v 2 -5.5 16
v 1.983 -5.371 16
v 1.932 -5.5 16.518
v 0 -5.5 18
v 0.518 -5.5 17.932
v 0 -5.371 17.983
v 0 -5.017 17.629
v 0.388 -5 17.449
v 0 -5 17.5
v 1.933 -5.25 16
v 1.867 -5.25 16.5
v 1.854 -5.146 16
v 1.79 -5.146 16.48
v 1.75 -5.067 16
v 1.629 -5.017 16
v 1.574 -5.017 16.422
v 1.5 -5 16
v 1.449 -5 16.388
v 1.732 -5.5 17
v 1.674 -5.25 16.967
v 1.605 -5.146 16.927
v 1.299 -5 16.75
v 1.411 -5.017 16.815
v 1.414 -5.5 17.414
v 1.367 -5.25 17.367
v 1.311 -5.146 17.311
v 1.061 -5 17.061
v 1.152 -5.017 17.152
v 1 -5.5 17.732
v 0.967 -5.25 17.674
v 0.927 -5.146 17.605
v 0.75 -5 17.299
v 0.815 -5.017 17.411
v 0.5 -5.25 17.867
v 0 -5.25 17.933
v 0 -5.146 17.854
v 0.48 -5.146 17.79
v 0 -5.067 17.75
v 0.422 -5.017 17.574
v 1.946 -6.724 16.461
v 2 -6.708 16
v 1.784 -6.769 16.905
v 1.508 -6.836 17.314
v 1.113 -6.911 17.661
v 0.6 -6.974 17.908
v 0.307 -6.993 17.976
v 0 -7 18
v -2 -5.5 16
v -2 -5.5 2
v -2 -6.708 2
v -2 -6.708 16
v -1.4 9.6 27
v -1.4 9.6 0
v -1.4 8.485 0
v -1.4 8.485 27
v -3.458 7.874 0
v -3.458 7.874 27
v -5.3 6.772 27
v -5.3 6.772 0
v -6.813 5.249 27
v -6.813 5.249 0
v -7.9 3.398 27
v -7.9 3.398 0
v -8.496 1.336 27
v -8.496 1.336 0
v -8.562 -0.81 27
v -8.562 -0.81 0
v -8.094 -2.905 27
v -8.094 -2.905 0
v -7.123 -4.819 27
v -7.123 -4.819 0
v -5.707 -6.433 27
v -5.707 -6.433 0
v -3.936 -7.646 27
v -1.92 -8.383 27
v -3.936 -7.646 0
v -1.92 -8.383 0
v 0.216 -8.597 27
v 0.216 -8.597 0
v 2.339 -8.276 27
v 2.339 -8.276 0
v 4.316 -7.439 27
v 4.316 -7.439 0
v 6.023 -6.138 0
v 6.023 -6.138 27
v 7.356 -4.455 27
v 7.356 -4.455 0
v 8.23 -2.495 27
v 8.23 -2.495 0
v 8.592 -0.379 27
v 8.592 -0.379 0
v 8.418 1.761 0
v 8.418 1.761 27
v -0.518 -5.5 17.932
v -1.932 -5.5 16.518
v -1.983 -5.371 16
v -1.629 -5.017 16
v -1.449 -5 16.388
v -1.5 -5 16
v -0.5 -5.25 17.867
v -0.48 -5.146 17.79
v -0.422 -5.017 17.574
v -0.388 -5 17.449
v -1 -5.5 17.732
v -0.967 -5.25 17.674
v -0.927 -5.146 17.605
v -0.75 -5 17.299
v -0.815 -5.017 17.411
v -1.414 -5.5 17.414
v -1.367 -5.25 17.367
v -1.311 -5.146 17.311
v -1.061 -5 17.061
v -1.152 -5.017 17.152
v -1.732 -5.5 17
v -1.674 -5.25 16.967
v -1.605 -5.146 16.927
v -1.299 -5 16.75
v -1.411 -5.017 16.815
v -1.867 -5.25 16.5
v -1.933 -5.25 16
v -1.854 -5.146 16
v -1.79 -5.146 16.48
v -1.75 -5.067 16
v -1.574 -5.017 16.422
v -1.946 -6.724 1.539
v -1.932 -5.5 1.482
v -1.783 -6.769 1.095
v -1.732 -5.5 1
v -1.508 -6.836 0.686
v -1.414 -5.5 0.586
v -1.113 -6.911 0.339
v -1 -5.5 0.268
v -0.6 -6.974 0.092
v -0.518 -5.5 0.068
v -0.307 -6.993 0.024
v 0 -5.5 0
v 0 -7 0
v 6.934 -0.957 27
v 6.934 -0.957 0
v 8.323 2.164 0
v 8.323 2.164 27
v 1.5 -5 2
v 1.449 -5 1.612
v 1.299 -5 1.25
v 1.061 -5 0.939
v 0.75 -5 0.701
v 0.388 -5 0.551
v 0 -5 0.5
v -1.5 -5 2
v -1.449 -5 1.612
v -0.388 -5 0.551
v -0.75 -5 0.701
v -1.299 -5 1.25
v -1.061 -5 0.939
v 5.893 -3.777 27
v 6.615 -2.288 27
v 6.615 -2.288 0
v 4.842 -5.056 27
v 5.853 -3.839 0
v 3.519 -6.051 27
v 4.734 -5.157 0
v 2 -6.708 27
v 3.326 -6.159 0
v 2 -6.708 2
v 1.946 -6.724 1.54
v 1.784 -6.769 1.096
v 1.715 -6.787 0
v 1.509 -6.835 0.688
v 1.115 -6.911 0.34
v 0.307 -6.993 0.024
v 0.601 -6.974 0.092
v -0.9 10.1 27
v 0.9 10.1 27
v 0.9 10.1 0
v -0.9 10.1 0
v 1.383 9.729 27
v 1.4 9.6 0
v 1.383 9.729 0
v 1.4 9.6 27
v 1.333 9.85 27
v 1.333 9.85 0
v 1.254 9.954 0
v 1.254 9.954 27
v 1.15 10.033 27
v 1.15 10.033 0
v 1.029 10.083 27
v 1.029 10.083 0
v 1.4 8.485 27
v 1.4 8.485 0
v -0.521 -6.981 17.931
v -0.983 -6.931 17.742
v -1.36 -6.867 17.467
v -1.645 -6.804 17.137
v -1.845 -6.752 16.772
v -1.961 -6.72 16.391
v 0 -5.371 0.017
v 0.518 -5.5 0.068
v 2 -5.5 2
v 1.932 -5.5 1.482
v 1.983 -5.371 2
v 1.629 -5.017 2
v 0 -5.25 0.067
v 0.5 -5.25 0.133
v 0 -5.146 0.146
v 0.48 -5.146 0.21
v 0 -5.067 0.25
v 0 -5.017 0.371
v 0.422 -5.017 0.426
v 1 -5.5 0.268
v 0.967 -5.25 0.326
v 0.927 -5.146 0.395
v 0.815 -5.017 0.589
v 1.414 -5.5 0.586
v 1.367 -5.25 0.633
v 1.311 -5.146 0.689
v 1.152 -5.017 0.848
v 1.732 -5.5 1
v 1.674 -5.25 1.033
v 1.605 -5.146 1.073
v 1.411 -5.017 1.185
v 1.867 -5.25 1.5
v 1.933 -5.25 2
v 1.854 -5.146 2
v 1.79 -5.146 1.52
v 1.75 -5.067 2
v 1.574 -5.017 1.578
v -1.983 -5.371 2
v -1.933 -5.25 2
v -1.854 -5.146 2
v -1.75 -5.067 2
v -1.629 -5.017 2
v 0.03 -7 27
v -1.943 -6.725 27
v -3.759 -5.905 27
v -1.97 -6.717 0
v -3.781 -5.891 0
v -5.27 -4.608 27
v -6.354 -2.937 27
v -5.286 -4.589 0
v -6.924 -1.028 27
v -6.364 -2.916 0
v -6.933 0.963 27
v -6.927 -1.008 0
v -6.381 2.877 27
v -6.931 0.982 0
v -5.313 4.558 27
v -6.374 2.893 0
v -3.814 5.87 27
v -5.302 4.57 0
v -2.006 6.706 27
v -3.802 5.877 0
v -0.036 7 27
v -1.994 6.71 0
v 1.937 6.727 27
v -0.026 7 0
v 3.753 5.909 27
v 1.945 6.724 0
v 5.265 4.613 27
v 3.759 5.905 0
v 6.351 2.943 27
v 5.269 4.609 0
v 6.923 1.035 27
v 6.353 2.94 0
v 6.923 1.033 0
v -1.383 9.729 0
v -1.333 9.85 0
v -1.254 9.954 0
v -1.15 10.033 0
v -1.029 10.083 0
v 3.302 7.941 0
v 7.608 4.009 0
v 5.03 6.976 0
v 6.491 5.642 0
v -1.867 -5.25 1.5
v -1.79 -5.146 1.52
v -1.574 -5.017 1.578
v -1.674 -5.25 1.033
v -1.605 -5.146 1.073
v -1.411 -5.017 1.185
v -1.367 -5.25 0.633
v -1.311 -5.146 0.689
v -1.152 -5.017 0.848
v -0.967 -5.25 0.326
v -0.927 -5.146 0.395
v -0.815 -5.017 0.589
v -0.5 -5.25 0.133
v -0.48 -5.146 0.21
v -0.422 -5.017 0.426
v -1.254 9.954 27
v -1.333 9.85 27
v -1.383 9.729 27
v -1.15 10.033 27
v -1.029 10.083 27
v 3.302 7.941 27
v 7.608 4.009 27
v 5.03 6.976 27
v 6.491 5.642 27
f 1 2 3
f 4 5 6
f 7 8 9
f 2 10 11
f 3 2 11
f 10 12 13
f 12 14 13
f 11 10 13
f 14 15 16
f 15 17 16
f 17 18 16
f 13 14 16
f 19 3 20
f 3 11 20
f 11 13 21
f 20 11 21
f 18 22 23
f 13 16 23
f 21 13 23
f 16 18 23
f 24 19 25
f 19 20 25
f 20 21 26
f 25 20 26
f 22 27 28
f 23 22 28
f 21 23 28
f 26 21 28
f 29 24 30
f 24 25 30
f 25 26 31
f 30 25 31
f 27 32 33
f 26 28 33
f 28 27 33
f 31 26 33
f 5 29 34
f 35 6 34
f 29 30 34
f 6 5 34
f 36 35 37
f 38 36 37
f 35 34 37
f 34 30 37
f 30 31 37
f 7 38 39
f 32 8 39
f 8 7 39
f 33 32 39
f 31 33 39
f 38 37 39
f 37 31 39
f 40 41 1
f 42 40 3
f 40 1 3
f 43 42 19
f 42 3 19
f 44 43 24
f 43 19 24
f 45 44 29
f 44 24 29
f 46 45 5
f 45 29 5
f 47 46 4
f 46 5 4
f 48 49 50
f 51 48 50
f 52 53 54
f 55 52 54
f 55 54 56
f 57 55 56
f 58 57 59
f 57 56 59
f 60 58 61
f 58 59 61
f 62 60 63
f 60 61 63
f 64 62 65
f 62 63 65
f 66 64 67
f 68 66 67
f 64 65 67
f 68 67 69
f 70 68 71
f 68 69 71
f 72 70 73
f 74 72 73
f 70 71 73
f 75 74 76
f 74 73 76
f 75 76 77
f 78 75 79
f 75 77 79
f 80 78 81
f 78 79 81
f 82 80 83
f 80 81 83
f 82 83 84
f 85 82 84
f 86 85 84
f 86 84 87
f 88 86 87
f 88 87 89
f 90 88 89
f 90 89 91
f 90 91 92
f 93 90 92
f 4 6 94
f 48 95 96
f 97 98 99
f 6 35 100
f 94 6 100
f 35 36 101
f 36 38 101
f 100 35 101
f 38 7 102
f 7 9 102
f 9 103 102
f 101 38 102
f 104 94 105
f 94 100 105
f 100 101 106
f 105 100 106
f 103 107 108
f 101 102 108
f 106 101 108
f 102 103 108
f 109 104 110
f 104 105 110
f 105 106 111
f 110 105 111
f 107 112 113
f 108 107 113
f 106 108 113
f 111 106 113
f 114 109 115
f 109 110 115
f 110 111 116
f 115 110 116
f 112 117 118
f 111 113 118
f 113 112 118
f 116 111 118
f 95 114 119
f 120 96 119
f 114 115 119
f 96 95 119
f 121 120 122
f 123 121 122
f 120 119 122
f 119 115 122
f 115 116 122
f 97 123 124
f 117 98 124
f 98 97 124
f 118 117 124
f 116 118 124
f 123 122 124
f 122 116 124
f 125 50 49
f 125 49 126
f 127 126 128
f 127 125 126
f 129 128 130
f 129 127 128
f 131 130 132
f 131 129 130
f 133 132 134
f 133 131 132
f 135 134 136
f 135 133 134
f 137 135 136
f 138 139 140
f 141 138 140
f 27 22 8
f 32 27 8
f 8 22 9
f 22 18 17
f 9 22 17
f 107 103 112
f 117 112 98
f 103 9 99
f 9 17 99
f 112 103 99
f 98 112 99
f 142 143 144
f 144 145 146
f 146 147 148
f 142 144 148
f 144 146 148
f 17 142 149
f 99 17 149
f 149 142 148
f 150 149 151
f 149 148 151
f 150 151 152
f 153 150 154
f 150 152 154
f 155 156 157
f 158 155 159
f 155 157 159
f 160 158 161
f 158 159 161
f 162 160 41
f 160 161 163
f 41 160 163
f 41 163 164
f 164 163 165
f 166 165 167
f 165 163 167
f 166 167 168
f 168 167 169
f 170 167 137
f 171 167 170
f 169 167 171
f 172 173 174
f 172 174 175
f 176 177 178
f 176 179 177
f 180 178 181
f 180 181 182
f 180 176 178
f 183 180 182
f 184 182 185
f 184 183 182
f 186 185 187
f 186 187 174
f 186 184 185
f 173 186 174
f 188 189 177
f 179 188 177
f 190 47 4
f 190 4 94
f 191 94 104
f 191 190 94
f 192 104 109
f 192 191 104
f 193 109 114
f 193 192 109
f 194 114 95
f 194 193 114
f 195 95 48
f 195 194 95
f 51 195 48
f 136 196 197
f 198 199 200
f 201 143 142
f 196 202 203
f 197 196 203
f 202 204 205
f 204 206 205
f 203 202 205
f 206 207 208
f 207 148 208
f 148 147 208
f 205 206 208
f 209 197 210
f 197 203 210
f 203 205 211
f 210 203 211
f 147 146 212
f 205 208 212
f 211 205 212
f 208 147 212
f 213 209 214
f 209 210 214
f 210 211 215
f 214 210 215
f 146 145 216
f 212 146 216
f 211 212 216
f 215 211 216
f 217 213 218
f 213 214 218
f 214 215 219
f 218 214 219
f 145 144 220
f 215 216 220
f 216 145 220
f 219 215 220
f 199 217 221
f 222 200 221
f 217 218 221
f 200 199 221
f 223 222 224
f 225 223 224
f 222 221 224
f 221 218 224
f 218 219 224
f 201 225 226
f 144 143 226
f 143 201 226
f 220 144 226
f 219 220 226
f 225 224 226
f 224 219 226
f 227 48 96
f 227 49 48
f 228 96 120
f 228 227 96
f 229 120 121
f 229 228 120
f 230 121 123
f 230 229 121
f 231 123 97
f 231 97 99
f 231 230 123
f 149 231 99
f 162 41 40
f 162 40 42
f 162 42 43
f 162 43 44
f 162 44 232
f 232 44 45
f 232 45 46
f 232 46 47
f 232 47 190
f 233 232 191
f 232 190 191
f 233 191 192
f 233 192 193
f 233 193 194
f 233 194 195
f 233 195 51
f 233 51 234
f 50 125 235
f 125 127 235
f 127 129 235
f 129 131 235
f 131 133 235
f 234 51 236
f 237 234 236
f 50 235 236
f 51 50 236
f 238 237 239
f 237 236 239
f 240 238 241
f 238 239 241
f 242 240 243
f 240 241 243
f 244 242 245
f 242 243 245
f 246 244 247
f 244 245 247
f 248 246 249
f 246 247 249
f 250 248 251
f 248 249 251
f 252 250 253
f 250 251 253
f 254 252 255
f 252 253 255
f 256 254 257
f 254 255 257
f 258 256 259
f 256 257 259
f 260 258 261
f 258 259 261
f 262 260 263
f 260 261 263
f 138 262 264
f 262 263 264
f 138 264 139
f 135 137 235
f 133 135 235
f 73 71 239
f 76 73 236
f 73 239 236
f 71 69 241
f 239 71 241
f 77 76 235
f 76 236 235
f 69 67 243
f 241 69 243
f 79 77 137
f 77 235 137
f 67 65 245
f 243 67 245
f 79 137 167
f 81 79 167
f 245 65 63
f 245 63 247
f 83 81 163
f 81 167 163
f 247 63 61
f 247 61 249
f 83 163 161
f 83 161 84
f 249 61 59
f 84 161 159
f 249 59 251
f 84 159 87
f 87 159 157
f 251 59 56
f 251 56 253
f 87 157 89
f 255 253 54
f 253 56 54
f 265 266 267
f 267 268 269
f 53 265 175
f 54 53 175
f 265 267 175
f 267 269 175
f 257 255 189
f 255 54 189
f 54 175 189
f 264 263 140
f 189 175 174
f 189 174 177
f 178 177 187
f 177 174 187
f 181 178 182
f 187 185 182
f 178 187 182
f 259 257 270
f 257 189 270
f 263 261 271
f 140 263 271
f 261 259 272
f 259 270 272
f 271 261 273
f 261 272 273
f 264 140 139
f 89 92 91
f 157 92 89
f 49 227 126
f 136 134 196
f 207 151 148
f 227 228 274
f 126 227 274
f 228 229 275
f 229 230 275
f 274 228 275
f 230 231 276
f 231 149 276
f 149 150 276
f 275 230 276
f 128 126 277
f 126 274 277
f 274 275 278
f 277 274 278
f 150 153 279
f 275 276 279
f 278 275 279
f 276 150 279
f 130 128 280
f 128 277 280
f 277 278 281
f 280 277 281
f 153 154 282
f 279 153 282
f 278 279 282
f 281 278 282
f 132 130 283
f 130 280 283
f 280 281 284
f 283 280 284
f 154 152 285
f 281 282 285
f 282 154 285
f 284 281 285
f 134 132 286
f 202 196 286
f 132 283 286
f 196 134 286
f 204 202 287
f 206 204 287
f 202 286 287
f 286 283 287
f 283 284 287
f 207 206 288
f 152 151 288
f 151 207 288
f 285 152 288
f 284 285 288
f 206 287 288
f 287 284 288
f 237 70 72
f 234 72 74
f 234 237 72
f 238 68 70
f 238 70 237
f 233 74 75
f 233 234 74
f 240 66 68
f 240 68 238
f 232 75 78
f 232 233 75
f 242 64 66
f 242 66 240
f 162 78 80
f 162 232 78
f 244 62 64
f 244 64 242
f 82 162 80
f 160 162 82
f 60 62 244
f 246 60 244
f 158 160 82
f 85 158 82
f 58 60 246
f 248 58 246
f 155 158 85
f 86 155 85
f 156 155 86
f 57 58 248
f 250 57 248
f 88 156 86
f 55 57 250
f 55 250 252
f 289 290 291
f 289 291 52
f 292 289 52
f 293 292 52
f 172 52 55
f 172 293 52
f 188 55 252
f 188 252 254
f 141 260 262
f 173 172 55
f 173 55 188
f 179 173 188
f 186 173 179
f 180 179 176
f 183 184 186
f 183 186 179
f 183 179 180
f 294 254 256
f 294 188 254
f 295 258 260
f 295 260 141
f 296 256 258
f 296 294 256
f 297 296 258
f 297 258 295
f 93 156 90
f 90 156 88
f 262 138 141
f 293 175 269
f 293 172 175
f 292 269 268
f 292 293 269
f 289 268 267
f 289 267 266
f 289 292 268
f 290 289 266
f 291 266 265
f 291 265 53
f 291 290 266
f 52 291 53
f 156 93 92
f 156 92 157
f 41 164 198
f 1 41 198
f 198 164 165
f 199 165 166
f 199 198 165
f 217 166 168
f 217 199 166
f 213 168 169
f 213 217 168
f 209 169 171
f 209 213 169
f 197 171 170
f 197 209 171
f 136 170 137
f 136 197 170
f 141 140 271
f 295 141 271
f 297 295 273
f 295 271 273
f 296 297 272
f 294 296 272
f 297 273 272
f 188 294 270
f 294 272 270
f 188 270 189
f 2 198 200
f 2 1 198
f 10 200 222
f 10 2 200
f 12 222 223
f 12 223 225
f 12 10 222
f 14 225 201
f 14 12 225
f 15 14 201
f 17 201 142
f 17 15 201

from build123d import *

# Parameters (mm, degrees)
F1_DEPTH = 27
F2_DEPTH = 18
F3_R     = 1.9999
F4_R     = 0.5


# Not quite as in the source:
# - a fillet or chamfer is up to 0.001 mm smaller than in the source, because OpenCascade refuses the exact size


with BuildPart() as f1:
    # F0 (on Top) → F1 (new body)
    with BuildSketch(Plane.XY):
        with BuildLine():
            ThreePointArc((6.6154708154, -2.2881315283), (4.8415745742, -5.0556063576), (2, -6.7082039325))
            ThreePointArc((2, -6.7082039325), (0, -7), (-2, -6.7082039325))
            ThreePointArc((-2, -6.7082039325), (-3.7888849897, 5.8859451692), (6.9342650073, -0.9570625938))
            Line((6.9342650073, -0.9570625938), (8.3233295817, 2.1638356393))
            ThreePointArc((8.3233295817, 2.1638356393), (5.7987889756, 6.3509091015), (1.4, 8.4852813742))
            Line((1.4, 8.4852813742), (1.4, 10.1))
            Line((1.4, 10.1), (-1.4, 10.1))
            Line((-1.4, 10.1), (-1.4, 8.4852813742))
            ThreePointArc((-1.4, 8.4852813742), (-4.8595970429, -7.0953728994), (8.4177416777, 1.7611431082))
            Line((8.4177416777, 1.7611431082), (6.6154708154, -2.2881315283))
        make_face()
    extrude(amount=F1_DEPTH)

    # F0 (on Top) → F2 (join)
    with BuildSketch(Plane.XY):
        with BuildLine():
            ThreePointArc((-2, -6.7082039325), (0, -7), (2, -6.7082039325))
            Line((2, -6.7082039325), (2, -5))
            Line((2, -5), (-2, -5))
            Line((-2, -5), (-2, -6.7082039325))
        make_face()
        with BuildLine():
            ThreePointArc((6.6154708154, -2.2881315283), (4.8415745742, -5.0556063576), (2, -6.7082039325))
            ThreePointArc((2, -6.7082039325), (0, -7), (-2, -6.7082039325))
            ThreePointArc((-2, -6.7082039325), (-3.7888849897, 5.8859451692), (6.9342650073, -0.9570625938))
            Line((6.9342650073, -0.9570625938), (8.3233295817, 2.1638356393))
            ThreePointArc((8.3233295817, 2.1638356393), (5.7987889756, 6.3509091015), (1.4, 8.4852813742))
            Line((1.4, 8.4852813742), (1.4, 10.1))
            Line((1.4, 10.1), (-1.4, 10.1))
            Line((-1.4, 10.1), (-1.4, 8.4852813742))
            ThreePointArc((-1.4, 8.4852813742), (-4.8595970429, -7.0953728994), (8.4177416777, 1.7611431082))
            Line((8.4177416777, 1.7611431082), (6.6154708154, -2.2881315283))
        make_face()
    extrude(amount=F2_DEPTH)

    # F3 (radius 2 in the source; OpenCascade refuses exactly that, so slightly less here)
    f3_edges = [f1.edges().sort_by_distance(p)[0] for p in [
        (2, -5.854102, 18),
        (-2, -5.854102, 18),
        (2, -5.854102, 0),
        (-2, -5.854102, 0),
    ]]
    fillet(f3_edges, radius=F3_R)

    # F4
    f4_edges = [f1.edges().sort_by_distance(p)[0] for p in [
        (2, -5, 9),
        (1.4, 10.1, 13.5),
        (-1.4, 10.1, 13.5),
    ]]
    fillet(f4_edges, radius=F4_R)


solid = f1.part
